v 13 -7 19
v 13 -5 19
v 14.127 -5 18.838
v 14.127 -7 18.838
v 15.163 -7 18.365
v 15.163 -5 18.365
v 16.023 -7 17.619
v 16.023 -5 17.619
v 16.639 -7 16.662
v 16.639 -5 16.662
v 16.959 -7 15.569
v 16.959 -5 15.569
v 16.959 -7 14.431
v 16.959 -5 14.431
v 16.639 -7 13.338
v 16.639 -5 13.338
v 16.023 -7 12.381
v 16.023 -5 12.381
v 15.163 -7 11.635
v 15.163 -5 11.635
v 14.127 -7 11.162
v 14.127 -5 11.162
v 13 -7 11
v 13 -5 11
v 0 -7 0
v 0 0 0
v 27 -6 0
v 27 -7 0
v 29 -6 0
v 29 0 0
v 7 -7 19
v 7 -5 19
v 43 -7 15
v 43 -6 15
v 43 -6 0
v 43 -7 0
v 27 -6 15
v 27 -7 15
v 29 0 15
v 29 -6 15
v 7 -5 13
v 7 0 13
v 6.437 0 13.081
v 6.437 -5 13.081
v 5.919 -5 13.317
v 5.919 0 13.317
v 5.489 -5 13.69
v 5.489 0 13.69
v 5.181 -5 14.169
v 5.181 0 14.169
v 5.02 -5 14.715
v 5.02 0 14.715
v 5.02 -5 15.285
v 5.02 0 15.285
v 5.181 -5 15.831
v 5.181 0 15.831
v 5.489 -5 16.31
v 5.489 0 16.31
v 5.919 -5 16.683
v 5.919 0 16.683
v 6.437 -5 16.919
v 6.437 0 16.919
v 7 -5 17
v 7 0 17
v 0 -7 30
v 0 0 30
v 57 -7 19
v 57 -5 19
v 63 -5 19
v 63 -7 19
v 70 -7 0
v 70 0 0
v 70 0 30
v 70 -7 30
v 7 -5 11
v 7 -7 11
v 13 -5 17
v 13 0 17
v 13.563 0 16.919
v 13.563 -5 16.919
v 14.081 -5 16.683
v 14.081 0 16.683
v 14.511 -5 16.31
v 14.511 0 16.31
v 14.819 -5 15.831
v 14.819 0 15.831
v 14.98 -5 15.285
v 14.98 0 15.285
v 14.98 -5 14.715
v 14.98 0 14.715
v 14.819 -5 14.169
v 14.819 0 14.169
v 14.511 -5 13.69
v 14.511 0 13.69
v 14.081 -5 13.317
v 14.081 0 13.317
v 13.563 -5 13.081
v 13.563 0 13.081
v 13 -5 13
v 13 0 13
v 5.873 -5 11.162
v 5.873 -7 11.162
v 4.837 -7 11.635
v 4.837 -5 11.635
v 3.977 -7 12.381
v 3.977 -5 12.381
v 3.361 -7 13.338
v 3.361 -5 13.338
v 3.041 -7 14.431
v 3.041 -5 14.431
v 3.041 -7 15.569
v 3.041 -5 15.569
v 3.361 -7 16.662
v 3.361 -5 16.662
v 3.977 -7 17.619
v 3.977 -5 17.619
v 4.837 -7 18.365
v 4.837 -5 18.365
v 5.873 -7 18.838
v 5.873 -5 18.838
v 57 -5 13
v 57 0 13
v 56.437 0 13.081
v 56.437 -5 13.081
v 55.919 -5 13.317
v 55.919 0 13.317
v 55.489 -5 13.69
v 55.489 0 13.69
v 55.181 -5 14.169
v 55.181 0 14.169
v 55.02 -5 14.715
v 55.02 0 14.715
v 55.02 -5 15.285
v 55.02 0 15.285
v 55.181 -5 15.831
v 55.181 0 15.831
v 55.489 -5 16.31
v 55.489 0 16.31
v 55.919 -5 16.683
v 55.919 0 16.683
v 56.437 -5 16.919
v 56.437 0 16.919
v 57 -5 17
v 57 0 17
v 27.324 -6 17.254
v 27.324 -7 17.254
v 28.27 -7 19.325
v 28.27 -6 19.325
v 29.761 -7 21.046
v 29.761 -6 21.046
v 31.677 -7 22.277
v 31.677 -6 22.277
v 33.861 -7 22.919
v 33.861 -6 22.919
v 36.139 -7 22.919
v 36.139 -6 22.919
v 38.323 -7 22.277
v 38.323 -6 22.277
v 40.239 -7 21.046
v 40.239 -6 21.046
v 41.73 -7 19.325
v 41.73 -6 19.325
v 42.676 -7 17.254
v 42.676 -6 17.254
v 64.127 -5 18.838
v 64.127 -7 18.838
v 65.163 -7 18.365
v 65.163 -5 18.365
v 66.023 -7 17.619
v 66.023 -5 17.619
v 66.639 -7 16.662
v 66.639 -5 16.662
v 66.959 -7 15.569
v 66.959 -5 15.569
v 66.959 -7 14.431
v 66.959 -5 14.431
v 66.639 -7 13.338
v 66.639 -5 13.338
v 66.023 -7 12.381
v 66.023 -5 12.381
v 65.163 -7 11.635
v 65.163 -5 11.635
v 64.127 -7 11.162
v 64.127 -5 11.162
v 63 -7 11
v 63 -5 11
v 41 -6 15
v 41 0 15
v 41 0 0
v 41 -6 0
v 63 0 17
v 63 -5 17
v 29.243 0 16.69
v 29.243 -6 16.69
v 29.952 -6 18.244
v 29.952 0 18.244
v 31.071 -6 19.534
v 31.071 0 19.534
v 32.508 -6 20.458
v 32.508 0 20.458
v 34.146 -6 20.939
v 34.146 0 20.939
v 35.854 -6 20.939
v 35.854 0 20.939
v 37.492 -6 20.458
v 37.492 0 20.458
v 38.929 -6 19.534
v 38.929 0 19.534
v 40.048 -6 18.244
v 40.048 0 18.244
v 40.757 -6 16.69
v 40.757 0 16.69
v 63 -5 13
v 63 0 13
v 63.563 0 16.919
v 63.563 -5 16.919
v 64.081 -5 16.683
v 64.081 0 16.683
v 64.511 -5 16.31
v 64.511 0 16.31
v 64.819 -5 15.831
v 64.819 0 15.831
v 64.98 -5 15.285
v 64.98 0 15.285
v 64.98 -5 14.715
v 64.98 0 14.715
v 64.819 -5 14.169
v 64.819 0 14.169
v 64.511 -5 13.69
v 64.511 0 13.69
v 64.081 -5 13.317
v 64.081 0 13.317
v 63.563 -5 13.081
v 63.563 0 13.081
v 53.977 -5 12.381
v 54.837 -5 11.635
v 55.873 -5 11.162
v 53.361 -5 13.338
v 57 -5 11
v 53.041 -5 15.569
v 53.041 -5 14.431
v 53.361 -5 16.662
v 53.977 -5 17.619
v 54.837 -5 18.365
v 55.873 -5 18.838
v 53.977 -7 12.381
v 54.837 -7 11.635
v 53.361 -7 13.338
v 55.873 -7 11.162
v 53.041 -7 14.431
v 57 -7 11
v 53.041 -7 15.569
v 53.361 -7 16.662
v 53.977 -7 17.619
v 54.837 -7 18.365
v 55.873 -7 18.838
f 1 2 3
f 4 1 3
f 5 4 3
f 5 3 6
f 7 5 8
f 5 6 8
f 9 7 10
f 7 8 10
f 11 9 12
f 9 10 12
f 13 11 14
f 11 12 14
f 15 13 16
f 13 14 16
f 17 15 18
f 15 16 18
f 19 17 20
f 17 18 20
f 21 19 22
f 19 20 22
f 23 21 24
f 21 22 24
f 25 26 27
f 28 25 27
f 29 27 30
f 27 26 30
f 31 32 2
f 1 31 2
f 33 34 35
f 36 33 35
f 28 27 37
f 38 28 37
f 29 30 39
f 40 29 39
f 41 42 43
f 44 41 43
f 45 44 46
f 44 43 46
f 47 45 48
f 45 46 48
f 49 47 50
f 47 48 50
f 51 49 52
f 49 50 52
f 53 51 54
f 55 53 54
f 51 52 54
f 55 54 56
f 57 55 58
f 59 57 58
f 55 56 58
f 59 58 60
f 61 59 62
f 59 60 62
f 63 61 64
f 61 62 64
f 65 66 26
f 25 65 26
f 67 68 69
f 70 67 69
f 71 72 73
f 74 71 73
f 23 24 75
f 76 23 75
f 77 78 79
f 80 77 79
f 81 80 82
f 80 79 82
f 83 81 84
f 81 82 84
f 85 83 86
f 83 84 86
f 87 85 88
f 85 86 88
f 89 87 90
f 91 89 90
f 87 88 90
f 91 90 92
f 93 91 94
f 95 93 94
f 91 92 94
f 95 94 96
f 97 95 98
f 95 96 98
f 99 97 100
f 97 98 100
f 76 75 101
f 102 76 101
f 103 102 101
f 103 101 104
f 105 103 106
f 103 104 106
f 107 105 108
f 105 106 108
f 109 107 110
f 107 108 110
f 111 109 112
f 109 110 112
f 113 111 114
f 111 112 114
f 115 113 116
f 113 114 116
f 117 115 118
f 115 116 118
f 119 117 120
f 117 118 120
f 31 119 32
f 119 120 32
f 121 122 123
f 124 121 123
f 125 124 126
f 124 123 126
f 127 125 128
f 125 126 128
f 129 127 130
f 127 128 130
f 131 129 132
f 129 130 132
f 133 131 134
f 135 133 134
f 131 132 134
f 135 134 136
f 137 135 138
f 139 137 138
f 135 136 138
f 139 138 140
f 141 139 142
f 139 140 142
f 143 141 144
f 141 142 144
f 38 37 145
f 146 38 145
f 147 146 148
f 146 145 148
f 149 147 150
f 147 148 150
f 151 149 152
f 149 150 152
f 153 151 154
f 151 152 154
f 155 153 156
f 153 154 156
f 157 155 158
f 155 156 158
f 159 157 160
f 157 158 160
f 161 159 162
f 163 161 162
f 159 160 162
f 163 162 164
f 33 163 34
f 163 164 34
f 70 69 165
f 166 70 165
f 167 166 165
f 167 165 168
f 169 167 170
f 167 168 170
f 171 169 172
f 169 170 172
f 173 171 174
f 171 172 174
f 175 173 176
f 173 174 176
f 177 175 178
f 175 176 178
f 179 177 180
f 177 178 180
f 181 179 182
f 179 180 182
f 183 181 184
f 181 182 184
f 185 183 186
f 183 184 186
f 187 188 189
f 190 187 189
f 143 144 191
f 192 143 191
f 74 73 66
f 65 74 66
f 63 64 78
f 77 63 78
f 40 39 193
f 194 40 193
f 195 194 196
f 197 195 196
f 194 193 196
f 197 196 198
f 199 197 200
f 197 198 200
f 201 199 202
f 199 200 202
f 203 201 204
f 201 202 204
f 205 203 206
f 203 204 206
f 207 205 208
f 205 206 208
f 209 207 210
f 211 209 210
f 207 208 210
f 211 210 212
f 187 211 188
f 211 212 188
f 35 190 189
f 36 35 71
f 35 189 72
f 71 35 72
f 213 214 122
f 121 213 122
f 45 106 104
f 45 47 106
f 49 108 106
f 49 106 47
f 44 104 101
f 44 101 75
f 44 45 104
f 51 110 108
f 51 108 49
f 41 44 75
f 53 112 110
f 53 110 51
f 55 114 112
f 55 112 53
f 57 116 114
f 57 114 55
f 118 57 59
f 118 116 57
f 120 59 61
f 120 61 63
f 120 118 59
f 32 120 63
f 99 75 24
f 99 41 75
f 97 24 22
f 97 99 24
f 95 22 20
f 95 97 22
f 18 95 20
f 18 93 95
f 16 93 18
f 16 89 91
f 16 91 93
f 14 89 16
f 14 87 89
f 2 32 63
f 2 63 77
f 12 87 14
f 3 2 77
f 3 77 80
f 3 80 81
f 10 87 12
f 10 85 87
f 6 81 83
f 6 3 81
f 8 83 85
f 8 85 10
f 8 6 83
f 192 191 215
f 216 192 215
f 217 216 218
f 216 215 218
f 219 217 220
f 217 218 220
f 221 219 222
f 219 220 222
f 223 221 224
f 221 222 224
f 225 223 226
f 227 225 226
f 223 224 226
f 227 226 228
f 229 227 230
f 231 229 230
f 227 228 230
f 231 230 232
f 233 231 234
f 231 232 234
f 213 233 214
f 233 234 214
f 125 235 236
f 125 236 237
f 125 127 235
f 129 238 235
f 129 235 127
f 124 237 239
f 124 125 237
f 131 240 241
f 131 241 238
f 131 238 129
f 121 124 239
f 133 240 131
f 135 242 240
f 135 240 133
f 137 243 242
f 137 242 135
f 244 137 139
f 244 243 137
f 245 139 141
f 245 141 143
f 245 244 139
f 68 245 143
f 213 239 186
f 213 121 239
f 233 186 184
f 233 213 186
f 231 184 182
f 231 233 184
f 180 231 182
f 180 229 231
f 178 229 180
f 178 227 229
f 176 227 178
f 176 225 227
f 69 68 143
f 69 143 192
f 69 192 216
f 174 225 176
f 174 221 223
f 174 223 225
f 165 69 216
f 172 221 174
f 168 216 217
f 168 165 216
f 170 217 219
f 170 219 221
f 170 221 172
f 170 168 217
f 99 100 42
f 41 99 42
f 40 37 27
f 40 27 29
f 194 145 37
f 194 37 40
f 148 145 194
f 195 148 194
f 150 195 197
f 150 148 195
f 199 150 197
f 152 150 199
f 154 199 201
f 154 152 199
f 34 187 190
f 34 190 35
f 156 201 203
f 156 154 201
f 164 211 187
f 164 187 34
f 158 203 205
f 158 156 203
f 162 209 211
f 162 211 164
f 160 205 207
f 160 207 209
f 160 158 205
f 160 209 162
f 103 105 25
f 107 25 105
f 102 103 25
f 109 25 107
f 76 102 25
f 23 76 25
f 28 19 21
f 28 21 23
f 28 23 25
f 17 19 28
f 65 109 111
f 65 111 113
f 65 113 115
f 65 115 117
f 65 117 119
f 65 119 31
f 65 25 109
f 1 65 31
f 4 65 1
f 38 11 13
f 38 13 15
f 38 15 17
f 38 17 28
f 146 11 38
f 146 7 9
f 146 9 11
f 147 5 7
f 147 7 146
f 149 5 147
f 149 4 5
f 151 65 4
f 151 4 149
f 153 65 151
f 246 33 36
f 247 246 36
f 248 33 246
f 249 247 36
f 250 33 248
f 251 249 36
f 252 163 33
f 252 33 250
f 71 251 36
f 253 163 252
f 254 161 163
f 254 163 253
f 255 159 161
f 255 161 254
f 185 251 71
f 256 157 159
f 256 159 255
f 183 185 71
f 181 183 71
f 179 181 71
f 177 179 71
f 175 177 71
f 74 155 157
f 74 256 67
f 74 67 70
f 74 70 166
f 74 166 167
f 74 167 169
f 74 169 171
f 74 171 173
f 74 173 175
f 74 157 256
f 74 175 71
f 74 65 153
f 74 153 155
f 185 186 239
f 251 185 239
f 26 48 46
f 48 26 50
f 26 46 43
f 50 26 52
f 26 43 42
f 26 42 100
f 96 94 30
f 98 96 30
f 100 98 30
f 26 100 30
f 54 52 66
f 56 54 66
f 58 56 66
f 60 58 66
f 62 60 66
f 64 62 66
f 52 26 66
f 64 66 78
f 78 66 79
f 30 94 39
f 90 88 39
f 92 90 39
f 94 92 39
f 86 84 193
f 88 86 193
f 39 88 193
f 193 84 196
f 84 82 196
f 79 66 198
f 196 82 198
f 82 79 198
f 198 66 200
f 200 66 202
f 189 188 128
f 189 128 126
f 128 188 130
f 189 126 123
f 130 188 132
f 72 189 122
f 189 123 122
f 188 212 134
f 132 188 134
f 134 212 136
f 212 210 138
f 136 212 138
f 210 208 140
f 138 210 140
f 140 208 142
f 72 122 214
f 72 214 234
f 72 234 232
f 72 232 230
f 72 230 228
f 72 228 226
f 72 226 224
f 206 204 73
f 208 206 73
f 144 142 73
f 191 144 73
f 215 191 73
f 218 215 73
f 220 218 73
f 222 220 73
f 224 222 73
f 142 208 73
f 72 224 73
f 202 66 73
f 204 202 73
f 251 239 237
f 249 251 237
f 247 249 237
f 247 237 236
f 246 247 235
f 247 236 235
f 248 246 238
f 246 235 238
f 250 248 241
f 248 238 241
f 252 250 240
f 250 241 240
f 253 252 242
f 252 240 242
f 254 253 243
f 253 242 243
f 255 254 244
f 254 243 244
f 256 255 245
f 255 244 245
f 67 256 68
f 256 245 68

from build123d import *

# Parameters (mm, degrees)
F1_DEPTH = 5
F2_DEPTH = 6
F3_DEPTH = 7
F4_DEPTH = 7


with BuildPart() as f1:
    # F0 (on Front) → F1 (new body)
    with BuildSketch(Plane.XZ):
        with BuildLine():
            Line((7, 11), (13, 11))
            ThreePointArc((13, 11), (17, 15), (13, 19))
            Line((13, 19), (7, 19))
            ThreePointArc((7, 19), (3, 15), (7, 11))
        make_face()
        with BuildLine():
            ThreePointArc((7, 13), (5, 15), (7, 17))
            Line((7, 17), (13, 17))
            ThreePointArc((13, 17), (15, 15), (13, 13))
            Line((13, 13), (7, 13))
        make_face(mode=Mode.SUBTRACT)
    extrude(amount=F1_DEPTH)



with BuildPart() as f1b:
    # F0 (on Front) → F1, piece 2 (new body)
    with BuildSketch(Plane.XZ):
        with BuildLine():
            ThreePointArc((63, 11), (67, 15), (63, 19))
            Line((63, 19), (57, 19))
            ThreePointArc((57, 19), (53, 15), (57, 11))
            Line((57, 11), (63, 11))
        make_face()
        with BuildLine():
            Line((57, 17), (63, 17))
            ThreePointArc((63, 17), (65, 15), (63, 13))
            Line((63, 13), (57, 13))
            ThreePointArc((57, 13), (55, 15), (57, 17))
        make_face(mode=Mode.SUBTRACT)
    extrude(amount=F1_DEPTH)


with BuildPart() as f2:
    # F0 (on Front) → F2 (new body)
    with BuildSketch(Plane.XZ):
        with BuildLine():
            Line((27, 15), (27, 0))
            Line((27, 0), (29, 0))
            Line((29, 0), (29, 15))
            ThreePointArc((29, 15), (35, 21), (41, 15))
            Line((41, 15), (41, 0))
            Line((41, 0), (43, 0))
            Line((43, 0), (43, 15))
            ThreePointArc((43, 15), (35, 23), (27, 15))
        make_face()
    extrude(amount=F2_DEPTH)


with BuildPart() as f1_1:
    add(f1.part)

    add(f1b.part)  # F3 merges F1b

    add(f2.part)  # F3 merges F2
    # F0 (on Front) → F3 (join)
    with BuildSketch(Plane.XZ):
        with BuildLine():
            Line((0, 30), (0, 0))
            Line((0, 0), (27, 0))
            Line((27, 0), (27, 15))
            ThreePointArc((27, 15), (35, 23), (43, 15))
            Line((43, 15), (43, 0))
            Line((43, 0), (70, 0))
            Line((70, 0), (70, 30))
            Line((70, 30), (0, 30))
        make_face()
        with BuildLine():
            ThreePointArc((13, 19), (17, 15), (13, 11))
            Line((13, 11), (7, 11))
            ThreePointArc((7, 11), (3, 15), (7, 19))
            Line((7, 19), (13, 19))
        make_face(mode=Mode.SUBTRACT)
        with BuildLine():
            Line((57, 19), (63, 19))
            ThreePointArc((63, 19), (67, 15), (63, 11))
            Line((63, 11), (57, 11))
            ThreePointArc((57, 11), (53, 15), (57, 19))
        make_face(mode=Mode.SUBTRACT)
    extrude(amount=F3_DEPTH)

    # F0 (on Front) → F4 (join)
    with BuildSketch(Plane.XZ):
        with BuildLine():
            Line((0, 30), (0, 0))
            Line((0, 0), (27, 0))
            Line((27, 0), (27, 15))
            ThreePointArc((27, 15), (35, 23), (43, 15))
            Line((43, 15), (43, 0))
            Line((43, 0), (70, 0))
            Line((70, 0), (70, 30))
            Line((70, 30), (0, 30))
        make_face()
        with BuildLine():
            ThreePointArc((13, 19), (17, 15), (13, 11))
            Line((13, 11), (7, 11))
            ThreePointArc((7, 11), (3, 15), (7, 19))
            Line((7, 19), (13, 19))
        make_face(mode=Mode.SUBTRACT)
        with BuildLine():
            Line((57, 19), (63, 19))
            ThreePointArc((63, 19), (67, 15), (63, 11))
            Line((63, 11), (57, 11))
            ThreePointArc((57, 11), (53, 15), (57, 19))
        make_face(mode=Mode.SUBTRACT)
    extrude(amount=F4_DEPTH)


solid = f1_1.part
